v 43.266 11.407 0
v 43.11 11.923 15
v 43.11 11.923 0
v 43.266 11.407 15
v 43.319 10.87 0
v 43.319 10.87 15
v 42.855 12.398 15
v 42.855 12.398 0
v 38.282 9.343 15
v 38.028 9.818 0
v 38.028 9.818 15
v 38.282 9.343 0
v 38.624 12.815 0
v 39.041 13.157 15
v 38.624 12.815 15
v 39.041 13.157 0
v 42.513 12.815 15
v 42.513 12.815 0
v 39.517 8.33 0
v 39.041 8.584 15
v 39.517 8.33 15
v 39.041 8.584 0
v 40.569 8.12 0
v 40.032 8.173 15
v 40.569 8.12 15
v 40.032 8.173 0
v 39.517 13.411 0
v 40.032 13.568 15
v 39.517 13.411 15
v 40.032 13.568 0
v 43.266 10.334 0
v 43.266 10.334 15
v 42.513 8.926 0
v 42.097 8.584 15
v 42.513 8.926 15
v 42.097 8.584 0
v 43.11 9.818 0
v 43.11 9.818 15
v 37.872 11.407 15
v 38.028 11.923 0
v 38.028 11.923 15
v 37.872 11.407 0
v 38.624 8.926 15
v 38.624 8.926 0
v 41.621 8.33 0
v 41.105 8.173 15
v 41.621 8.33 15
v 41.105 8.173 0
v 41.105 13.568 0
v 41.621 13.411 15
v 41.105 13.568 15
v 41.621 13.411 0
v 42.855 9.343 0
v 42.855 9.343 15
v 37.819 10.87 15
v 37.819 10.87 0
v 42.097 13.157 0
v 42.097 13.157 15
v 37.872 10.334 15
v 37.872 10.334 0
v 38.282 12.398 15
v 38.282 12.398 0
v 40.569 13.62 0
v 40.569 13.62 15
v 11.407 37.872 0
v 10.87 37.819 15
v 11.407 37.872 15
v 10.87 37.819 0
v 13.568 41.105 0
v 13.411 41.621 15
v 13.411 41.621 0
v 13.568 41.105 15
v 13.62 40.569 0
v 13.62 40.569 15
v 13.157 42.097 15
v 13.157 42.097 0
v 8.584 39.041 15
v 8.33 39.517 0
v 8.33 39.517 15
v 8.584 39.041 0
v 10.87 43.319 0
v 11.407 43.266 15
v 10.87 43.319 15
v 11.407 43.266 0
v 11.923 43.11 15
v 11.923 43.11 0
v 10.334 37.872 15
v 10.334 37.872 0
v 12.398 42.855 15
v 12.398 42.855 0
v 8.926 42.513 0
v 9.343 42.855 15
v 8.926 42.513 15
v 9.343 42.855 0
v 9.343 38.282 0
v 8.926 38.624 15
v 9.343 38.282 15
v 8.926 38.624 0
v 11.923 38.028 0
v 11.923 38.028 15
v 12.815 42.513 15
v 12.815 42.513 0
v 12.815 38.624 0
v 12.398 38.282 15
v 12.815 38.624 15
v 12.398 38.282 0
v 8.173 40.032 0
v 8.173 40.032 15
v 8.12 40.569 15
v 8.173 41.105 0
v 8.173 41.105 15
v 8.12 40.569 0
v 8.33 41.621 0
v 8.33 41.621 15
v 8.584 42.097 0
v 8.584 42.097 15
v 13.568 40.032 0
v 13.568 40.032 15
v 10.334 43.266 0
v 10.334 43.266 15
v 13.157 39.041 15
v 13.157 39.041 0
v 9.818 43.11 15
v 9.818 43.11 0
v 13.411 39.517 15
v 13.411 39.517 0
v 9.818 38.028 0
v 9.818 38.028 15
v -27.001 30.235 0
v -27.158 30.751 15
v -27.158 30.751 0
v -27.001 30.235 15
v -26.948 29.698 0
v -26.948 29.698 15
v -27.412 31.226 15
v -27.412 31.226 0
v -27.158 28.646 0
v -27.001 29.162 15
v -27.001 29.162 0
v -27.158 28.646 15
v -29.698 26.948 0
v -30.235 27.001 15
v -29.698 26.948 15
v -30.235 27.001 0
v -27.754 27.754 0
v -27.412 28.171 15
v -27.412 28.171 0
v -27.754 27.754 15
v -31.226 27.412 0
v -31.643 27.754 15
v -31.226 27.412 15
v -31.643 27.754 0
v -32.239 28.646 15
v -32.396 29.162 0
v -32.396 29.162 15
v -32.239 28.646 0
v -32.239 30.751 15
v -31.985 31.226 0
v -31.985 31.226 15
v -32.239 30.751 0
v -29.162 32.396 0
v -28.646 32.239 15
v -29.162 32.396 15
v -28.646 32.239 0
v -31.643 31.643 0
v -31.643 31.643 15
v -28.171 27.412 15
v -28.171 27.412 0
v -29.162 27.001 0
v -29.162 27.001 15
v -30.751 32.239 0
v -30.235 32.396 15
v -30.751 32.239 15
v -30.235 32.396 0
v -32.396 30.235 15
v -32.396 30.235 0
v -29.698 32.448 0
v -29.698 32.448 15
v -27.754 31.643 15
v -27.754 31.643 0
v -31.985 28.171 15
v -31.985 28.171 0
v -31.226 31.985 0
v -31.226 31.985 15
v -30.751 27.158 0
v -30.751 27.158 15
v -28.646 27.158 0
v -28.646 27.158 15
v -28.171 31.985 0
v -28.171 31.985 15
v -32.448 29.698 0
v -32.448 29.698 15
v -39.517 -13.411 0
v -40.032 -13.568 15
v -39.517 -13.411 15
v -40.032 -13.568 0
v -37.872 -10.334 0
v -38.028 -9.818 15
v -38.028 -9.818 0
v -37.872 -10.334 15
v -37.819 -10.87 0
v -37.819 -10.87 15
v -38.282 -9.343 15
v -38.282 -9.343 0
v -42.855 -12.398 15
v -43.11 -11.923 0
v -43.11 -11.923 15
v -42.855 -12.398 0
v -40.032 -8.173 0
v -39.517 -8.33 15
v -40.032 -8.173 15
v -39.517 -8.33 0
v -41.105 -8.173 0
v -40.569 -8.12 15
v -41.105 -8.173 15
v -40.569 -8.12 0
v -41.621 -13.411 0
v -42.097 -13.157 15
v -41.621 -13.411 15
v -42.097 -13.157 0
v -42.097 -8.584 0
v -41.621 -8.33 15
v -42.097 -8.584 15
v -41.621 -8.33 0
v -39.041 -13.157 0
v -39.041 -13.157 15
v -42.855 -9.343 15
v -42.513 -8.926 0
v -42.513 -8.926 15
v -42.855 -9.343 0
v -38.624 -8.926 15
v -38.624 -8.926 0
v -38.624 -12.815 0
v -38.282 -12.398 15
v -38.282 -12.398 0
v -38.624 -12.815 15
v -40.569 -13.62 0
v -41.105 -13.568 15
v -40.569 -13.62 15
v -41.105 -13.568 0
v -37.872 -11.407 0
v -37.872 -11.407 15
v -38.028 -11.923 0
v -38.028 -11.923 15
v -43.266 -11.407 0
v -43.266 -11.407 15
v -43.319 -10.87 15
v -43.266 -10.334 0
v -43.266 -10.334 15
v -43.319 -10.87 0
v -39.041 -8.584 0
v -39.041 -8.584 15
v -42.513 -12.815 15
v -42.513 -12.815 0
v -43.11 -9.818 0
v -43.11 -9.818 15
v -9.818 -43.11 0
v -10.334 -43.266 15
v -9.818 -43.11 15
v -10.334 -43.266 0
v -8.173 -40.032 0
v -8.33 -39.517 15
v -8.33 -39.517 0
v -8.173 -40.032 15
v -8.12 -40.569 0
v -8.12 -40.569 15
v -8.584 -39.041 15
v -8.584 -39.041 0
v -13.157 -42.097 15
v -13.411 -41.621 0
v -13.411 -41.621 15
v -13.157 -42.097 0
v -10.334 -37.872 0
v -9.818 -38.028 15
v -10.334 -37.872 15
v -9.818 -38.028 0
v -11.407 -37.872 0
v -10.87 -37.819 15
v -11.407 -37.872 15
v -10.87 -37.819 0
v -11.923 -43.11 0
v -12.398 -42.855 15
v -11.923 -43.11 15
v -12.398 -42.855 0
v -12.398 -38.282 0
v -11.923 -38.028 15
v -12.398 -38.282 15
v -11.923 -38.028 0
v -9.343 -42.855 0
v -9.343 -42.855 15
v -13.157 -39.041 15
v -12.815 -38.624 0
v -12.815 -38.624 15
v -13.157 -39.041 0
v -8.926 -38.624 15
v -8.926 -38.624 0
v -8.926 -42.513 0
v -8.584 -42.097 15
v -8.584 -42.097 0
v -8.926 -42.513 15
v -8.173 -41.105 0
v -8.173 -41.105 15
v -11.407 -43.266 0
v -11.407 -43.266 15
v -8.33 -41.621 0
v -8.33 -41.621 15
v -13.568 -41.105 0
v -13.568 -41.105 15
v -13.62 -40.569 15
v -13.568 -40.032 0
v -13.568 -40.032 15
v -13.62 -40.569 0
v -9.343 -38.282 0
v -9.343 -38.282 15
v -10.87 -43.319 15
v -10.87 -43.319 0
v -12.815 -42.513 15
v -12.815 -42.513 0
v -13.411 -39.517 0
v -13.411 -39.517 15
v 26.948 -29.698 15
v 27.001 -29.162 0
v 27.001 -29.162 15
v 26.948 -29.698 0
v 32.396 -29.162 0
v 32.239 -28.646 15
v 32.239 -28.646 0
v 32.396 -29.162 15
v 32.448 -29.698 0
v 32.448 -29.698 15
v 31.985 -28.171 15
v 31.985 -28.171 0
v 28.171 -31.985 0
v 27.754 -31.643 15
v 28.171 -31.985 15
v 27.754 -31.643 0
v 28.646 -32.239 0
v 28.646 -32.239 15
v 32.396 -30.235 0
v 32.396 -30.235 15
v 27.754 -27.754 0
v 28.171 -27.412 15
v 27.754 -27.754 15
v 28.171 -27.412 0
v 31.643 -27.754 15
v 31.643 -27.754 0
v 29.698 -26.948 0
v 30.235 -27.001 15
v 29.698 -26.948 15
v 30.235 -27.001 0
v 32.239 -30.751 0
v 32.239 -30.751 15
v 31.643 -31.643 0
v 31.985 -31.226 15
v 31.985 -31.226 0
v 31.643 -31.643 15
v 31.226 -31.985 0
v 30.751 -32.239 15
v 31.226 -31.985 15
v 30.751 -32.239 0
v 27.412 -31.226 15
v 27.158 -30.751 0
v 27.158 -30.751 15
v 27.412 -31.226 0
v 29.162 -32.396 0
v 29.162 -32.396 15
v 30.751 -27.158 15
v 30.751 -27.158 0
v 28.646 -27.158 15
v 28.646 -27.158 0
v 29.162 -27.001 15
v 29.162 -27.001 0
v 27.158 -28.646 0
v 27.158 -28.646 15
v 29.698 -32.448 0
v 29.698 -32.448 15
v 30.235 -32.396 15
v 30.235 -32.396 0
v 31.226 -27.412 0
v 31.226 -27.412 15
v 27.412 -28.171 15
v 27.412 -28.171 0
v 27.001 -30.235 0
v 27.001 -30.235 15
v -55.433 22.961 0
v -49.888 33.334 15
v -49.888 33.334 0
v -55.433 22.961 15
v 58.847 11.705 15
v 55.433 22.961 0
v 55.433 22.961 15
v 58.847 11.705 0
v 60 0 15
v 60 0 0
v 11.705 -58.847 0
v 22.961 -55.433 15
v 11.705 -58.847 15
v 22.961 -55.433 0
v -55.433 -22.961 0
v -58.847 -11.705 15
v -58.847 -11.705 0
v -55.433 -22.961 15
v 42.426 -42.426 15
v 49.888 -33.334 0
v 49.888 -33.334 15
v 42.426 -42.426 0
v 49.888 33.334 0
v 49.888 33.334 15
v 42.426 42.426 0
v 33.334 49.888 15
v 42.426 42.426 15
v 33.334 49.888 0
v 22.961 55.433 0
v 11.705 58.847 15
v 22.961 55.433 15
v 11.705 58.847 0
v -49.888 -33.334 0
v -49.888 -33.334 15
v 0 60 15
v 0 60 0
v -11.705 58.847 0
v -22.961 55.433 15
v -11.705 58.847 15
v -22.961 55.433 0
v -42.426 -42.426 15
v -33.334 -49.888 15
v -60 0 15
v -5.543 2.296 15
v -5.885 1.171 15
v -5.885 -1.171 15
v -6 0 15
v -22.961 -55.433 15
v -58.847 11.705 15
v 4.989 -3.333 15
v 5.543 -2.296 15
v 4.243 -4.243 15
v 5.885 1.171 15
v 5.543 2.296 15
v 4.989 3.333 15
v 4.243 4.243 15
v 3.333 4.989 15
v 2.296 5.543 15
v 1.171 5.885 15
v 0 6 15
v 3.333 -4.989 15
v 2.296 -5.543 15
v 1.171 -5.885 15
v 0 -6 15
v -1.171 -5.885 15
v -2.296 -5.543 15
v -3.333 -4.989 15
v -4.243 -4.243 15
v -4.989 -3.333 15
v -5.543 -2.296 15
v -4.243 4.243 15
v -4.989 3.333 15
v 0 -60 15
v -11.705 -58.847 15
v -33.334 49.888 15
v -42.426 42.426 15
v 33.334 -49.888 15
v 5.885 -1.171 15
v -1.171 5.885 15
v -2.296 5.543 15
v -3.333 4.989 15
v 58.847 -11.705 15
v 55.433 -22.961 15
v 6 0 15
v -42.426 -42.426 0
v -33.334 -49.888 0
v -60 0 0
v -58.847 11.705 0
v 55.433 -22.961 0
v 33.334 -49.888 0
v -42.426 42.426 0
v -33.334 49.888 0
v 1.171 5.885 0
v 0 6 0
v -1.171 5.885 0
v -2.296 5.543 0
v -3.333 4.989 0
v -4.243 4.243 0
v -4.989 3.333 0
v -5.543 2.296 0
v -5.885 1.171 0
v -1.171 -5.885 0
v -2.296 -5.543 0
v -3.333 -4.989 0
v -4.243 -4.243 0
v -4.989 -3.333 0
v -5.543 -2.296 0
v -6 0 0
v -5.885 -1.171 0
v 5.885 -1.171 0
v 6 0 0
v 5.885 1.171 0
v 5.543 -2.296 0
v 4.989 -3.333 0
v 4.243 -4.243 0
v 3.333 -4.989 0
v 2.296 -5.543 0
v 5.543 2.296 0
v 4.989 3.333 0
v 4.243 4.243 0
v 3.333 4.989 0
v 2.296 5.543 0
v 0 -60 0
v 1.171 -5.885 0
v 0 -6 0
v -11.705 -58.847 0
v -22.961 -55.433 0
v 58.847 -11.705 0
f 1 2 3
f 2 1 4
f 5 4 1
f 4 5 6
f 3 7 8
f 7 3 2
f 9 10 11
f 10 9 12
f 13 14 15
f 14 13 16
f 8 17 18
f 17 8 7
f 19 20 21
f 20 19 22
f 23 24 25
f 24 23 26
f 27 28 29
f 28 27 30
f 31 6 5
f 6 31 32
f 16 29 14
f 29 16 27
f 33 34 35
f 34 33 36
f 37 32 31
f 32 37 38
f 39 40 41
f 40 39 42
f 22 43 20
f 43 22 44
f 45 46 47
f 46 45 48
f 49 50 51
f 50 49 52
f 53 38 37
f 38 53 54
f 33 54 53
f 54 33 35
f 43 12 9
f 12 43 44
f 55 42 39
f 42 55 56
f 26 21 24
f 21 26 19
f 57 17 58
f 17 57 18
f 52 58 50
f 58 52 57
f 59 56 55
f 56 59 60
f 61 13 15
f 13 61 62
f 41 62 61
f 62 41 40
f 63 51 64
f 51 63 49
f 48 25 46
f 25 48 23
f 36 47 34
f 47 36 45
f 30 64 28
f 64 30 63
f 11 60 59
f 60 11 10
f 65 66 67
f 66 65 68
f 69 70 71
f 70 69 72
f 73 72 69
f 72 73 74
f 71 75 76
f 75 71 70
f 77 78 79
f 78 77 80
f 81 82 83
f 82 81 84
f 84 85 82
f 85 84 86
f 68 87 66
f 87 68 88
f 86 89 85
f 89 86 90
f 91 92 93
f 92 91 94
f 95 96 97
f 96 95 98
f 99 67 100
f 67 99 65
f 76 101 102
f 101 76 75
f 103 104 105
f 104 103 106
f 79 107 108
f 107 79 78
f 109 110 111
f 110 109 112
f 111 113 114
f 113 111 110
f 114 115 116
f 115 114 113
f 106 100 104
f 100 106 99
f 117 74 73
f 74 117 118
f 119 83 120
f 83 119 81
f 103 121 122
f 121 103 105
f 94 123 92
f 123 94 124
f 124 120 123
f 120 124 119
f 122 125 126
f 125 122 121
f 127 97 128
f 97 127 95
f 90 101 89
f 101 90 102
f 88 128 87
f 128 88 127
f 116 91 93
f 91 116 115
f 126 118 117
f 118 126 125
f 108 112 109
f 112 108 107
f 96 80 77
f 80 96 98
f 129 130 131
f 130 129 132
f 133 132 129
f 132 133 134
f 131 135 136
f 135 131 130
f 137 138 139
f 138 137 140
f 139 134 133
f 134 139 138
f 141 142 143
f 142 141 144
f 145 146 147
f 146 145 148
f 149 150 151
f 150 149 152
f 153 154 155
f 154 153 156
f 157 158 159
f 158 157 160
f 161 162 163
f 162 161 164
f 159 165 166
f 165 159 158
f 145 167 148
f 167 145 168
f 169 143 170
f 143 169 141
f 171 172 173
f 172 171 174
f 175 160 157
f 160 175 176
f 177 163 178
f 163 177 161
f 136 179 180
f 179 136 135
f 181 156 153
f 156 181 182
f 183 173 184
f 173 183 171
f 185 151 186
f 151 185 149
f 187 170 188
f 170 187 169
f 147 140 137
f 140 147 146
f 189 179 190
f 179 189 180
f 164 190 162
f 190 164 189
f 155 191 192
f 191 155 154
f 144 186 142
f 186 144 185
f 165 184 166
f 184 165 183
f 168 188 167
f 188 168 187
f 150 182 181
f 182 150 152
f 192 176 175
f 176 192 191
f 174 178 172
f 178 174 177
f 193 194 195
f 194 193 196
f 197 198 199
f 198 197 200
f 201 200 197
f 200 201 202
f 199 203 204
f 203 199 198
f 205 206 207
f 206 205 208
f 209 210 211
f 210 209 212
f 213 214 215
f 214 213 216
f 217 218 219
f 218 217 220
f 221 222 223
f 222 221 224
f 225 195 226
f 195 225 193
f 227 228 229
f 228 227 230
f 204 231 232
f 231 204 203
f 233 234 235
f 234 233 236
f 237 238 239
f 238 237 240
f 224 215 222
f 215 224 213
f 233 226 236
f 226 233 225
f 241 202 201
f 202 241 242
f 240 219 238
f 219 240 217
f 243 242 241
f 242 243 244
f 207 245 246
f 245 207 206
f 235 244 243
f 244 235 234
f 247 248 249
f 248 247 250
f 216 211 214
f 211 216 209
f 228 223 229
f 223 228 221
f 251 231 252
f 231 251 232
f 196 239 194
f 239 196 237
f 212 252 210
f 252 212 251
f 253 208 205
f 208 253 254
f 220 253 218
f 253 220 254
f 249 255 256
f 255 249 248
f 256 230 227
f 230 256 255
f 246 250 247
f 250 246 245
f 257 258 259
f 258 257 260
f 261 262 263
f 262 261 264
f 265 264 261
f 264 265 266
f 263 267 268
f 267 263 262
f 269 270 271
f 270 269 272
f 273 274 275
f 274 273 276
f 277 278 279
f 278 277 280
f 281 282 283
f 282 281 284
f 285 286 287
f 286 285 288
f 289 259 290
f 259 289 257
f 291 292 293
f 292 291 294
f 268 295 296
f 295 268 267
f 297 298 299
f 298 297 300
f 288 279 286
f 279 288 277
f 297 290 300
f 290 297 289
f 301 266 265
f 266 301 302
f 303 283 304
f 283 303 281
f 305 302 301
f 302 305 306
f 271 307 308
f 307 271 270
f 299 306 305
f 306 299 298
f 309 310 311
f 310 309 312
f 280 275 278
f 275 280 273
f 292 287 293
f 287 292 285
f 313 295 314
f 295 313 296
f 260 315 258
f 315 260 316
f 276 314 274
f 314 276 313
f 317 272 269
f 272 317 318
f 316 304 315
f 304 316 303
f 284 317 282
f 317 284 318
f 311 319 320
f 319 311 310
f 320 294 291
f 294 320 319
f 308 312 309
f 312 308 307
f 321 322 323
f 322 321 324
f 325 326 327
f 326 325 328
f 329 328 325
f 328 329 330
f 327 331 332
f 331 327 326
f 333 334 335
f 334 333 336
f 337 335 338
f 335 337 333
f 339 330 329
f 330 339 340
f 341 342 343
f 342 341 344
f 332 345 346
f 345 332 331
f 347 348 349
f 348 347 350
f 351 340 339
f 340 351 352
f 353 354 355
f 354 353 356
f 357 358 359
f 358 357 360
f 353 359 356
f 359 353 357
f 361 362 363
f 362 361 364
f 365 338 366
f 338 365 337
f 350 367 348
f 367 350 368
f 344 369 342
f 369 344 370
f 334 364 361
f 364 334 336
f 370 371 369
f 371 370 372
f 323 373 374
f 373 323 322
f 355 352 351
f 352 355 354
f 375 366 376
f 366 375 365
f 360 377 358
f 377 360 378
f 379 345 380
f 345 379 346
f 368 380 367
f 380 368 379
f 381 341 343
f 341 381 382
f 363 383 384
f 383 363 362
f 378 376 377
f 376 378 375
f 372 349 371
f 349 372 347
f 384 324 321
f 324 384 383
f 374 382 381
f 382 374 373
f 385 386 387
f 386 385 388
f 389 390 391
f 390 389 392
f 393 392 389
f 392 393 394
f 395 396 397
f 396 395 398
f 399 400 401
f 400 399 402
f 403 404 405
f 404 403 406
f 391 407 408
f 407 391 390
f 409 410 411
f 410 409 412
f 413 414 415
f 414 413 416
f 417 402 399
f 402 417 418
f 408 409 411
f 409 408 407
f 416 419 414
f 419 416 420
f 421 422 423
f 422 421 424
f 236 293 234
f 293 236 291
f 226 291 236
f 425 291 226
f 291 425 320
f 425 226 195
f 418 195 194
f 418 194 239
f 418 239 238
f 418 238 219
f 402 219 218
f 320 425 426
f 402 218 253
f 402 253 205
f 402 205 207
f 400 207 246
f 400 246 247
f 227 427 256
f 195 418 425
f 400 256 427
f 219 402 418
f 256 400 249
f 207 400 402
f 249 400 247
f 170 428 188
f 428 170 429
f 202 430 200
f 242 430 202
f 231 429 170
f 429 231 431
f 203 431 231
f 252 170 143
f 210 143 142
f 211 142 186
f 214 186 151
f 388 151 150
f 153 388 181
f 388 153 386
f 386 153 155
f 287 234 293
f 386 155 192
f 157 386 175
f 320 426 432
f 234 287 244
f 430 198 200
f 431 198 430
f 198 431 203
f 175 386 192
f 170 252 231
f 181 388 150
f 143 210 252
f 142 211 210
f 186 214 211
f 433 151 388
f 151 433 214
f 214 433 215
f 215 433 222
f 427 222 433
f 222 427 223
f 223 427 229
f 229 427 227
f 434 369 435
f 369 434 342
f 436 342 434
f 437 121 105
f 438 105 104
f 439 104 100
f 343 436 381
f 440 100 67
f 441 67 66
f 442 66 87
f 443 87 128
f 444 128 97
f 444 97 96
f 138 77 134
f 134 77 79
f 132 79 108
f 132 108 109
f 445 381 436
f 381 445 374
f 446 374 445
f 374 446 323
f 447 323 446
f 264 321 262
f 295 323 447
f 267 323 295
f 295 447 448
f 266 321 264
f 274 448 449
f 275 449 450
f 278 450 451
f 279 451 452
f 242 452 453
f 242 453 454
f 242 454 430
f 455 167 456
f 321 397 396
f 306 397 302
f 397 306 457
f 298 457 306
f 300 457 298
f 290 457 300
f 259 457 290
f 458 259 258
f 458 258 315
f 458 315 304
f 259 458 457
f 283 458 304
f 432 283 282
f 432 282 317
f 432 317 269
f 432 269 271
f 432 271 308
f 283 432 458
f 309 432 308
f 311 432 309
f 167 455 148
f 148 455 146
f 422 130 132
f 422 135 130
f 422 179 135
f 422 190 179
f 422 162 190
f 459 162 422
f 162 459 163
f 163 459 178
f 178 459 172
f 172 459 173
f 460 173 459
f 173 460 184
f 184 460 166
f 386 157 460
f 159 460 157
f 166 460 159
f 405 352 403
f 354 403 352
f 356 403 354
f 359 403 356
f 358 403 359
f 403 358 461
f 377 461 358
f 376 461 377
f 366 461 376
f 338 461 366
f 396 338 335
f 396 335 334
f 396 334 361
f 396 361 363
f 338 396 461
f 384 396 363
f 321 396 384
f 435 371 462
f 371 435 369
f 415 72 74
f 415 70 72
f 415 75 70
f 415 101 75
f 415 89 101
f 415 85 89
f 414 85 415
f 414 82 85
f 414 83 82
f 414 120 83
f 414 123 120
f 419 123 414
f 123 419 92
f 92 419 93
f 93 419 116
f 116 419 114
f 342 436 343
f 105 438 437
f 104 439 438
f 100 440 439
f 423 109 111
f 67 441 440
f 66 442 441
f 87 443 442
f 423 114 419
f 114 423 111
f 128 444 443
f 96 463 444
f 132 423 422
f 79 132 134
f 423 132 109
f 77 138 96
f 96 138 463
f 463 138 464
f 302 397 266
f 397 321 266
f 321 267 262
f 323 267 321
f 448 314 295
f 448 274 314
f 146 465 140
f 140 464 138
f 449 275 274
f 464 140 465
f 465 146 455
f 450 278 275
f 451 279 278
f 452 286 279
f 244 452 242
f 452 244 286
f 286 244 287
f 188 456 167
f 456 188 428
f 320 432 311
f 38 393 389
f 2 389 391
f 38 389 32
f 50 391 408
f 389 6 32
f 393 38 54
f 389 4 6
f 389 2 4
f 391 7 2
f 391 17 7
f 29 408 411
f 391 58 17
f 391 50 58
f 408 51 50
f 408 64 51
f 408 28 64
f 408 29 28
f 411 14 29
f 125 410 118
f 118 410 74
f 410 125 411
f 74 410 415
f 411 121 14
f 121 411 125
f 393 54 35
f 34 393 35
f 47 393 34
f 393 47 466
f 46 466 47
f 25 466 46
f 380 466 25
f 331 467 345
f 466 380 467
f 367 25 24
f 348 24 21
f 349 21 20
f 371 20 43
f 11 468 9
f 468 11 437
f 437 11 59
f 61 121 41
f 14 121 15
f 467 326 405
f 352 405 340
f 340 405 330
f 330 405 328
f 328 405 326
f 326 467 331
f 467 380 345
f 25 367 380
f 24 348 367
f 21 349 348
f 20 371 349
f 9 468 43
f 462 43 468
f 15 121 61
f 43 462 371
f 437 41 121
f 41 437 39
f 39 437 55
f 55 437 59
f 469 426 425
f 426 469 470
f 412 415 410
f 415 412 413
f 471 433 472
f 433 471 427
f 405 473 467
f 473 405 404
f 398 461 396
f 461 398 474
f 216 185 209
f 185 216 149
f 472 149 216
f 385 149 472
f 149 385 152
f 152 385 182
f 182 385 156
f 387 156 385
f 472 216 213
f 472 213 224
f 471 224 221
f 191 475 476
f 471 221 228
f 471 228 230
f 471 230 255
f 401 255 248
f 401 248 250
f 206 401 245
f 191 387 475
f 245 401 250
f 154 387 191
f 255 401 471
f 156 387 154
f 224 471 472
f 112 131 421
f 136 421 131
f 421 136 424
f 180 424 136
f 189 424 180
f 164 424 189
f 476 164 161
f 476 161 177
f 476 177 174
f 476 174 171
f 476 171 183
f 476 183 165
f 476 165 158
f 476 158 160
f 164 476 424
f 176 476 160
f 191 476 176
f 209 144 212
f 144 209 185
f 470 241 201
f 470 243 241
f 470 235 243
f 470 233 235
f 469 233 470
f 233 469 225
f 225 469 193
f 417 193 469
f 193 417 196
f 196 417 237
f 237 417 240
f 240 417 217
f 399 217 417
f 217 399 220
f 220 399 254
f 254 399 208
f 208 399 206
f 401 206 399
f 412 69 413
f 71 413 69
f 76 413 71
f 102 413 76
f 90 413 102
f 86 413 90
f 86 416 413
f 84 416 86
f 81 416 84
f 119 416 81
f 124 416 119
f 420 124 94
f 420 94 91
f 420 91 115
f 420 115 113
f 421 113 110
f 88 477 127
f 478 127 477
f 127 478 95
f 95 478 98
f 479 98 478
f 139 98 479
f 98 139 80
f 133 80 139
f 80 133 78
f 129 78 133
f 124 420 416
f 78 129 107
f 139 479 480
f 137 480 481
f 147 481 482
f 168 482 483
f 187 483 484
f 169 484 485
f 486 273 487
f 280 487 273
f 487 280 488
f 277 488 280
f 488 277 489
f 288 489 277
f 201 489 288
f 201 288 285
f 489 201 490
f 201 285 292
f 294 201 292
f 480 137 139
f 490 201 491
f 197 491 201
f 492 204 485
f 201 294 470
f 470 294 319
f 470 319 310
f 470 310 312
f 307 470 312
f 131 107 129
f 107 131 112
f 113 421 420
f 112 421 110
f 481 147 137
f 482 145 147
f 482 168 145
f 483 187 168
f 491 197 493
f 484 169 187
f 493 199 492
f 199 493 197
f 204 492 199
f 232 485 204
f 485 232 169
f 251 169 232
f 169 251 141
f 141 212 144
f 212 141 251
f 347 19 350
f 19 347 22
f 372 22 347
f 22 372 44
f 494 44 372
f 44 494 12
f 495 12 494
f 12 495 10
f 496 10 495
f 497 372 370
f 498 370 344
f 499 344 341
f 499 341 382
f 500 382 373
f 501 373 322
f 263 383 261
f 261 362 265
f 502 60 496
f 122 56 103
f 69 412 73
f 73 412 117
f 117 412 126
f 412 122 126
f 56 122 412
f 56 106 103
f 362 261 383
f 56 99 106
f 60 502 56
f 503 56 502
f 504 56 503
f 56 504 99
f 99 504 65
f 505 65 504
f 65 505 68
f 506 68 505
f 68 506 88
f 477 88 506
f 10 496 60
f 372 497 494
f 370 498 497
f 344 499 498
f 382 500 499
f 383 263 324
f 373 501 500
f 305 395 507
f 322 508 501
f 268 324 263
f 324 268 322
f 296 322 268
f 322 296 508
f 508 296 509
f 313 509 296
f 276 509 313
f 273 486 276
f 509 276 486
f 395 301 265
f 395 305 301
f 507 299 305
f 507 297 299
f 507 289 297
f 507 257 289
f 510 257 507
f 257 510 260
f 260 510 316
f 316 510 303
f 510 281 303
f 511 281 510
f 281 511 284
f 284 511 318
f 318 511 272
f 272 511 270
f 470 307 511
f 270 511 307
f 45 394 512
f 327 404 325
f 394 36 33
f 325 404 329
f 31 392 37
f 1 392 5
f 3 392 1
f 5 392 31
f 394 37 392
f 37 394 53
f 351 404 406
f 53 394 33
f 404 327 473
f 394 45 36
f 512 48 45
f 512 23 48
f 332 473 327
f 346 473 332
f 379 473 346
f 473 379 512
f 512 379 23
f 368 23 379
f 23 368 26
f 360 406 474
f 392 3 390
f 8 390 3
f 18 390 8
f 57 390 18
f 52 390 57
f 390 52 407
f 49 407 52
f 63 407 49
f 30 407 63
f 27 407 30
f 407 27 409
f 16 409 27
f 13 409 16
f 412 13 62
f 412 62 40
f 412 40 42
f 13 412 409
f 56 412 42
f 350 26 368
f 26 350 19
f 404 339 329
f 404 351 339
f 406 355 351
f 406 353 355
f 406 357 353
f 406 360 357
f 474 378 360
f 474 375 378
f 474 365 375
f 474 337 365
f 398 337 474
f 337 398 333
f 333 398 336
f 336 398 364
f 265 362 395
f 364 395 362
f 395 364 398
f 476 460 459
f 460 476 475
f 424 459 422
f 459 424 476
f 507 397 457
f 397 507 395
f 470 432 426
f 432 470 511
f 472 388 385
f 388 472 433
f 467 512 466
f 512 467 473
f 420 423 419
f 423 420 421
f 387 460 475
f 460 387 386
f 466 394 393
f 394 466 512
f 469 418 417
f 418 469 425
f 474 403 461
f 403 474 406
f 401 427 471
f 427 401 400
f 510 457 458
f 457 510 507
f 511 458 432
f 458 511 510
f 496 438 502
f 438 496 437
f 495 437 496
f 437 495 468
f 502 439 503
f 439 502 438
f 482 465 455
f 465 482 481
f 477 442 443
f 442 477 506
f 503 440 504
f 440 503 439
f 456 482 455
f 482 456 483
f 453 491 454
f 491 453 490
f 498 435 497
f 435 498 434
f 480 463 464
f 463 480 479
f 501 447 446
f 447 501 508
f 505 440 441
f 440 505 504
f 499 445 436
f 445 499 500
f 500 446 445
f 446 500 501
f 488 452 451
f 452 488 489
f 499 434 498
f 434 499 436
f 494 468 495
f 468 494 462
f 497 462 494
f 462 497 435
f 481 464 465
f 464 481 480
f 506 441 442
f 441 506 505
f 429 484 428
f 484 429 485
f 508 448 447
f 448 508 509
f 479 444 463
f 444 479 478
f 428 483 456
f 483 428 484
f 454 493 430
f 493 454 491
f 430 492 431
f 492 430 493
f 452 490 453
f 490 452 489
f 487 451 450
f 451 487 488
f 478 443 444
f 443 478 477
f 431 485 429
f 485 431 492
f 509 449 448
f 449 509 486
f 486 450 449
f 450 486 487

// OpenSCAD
$fn = 32;

// ----------------------------------------------------------------------
// Flange Ø120 x 15
// 6 holes on a Ø84 bolt circle, bolted joints
// ----------------------------------------------------------------------

// --- parameters (mm) ---
flange_d = 120;  // outside diameter of the flange
thickness = 15;  // flange thickness
holes = 6;       // number of bolt holes
pcd = 84;        // bolt circle diameter
start_deg = 15;  // angle of the first hole, from +X
hole_d = 5.5;    // bolt hole diameter
bore_d = 12;     // central through bore
hub_d = 24;      // hub outside diameter
hub_h = 0;       // hub height above the flange face (0 = no hub)

// --- derived feature positions (mm) ---
height = thickness + hub_h;  // = 15   overall height of the part
pcd_r = pcd / 2;             // = 42   bolt circle radius
hole_step = 360 / holes;     // = 60   angular pitch
feature_centers = [
  [pcd_r * cos(start_deg + 0 * hole_step), pcd_r * sin(start_deg + 0 * hole_step)],
  [pcd_r * cos(start_deg + 1 * hole_step), pcd_r * sin(start_deg + 1 * hole_step)],
  [pcd_r * cos(start_deg + 2 * hole_step), pcd_r * sin(start_deg + 2 * hole_step)],
  [pcd_r * cos(start_deg + 3 * hole_step), pcd_r * sin(start_deg + 3 * hole_step)],
  [pcd_r * cos(start_deg + 4 * hole_step), pcd_r * sin(start_deg + 4 * hole_step)],
  [pcd_r * cos(start_deg + 5 * hole_step), pcd_r * sin(start_deg + 5 * hole_step)]
];   // bolt hole centres on the pitch circle

// flange disc, every hole and the bore cut straight through
difference() {
  union() {
    cylinder(d = flange_d, h = thickness);
  }
  translate([0, 0, -1]) cylinder(d = bore_d, h = height + 2);  // bore, through
  for (centre = feature_centers)
    translate([centre[0], centre[1], -1]) cylinder(d = hole_d, h = thickness + 2);
}
